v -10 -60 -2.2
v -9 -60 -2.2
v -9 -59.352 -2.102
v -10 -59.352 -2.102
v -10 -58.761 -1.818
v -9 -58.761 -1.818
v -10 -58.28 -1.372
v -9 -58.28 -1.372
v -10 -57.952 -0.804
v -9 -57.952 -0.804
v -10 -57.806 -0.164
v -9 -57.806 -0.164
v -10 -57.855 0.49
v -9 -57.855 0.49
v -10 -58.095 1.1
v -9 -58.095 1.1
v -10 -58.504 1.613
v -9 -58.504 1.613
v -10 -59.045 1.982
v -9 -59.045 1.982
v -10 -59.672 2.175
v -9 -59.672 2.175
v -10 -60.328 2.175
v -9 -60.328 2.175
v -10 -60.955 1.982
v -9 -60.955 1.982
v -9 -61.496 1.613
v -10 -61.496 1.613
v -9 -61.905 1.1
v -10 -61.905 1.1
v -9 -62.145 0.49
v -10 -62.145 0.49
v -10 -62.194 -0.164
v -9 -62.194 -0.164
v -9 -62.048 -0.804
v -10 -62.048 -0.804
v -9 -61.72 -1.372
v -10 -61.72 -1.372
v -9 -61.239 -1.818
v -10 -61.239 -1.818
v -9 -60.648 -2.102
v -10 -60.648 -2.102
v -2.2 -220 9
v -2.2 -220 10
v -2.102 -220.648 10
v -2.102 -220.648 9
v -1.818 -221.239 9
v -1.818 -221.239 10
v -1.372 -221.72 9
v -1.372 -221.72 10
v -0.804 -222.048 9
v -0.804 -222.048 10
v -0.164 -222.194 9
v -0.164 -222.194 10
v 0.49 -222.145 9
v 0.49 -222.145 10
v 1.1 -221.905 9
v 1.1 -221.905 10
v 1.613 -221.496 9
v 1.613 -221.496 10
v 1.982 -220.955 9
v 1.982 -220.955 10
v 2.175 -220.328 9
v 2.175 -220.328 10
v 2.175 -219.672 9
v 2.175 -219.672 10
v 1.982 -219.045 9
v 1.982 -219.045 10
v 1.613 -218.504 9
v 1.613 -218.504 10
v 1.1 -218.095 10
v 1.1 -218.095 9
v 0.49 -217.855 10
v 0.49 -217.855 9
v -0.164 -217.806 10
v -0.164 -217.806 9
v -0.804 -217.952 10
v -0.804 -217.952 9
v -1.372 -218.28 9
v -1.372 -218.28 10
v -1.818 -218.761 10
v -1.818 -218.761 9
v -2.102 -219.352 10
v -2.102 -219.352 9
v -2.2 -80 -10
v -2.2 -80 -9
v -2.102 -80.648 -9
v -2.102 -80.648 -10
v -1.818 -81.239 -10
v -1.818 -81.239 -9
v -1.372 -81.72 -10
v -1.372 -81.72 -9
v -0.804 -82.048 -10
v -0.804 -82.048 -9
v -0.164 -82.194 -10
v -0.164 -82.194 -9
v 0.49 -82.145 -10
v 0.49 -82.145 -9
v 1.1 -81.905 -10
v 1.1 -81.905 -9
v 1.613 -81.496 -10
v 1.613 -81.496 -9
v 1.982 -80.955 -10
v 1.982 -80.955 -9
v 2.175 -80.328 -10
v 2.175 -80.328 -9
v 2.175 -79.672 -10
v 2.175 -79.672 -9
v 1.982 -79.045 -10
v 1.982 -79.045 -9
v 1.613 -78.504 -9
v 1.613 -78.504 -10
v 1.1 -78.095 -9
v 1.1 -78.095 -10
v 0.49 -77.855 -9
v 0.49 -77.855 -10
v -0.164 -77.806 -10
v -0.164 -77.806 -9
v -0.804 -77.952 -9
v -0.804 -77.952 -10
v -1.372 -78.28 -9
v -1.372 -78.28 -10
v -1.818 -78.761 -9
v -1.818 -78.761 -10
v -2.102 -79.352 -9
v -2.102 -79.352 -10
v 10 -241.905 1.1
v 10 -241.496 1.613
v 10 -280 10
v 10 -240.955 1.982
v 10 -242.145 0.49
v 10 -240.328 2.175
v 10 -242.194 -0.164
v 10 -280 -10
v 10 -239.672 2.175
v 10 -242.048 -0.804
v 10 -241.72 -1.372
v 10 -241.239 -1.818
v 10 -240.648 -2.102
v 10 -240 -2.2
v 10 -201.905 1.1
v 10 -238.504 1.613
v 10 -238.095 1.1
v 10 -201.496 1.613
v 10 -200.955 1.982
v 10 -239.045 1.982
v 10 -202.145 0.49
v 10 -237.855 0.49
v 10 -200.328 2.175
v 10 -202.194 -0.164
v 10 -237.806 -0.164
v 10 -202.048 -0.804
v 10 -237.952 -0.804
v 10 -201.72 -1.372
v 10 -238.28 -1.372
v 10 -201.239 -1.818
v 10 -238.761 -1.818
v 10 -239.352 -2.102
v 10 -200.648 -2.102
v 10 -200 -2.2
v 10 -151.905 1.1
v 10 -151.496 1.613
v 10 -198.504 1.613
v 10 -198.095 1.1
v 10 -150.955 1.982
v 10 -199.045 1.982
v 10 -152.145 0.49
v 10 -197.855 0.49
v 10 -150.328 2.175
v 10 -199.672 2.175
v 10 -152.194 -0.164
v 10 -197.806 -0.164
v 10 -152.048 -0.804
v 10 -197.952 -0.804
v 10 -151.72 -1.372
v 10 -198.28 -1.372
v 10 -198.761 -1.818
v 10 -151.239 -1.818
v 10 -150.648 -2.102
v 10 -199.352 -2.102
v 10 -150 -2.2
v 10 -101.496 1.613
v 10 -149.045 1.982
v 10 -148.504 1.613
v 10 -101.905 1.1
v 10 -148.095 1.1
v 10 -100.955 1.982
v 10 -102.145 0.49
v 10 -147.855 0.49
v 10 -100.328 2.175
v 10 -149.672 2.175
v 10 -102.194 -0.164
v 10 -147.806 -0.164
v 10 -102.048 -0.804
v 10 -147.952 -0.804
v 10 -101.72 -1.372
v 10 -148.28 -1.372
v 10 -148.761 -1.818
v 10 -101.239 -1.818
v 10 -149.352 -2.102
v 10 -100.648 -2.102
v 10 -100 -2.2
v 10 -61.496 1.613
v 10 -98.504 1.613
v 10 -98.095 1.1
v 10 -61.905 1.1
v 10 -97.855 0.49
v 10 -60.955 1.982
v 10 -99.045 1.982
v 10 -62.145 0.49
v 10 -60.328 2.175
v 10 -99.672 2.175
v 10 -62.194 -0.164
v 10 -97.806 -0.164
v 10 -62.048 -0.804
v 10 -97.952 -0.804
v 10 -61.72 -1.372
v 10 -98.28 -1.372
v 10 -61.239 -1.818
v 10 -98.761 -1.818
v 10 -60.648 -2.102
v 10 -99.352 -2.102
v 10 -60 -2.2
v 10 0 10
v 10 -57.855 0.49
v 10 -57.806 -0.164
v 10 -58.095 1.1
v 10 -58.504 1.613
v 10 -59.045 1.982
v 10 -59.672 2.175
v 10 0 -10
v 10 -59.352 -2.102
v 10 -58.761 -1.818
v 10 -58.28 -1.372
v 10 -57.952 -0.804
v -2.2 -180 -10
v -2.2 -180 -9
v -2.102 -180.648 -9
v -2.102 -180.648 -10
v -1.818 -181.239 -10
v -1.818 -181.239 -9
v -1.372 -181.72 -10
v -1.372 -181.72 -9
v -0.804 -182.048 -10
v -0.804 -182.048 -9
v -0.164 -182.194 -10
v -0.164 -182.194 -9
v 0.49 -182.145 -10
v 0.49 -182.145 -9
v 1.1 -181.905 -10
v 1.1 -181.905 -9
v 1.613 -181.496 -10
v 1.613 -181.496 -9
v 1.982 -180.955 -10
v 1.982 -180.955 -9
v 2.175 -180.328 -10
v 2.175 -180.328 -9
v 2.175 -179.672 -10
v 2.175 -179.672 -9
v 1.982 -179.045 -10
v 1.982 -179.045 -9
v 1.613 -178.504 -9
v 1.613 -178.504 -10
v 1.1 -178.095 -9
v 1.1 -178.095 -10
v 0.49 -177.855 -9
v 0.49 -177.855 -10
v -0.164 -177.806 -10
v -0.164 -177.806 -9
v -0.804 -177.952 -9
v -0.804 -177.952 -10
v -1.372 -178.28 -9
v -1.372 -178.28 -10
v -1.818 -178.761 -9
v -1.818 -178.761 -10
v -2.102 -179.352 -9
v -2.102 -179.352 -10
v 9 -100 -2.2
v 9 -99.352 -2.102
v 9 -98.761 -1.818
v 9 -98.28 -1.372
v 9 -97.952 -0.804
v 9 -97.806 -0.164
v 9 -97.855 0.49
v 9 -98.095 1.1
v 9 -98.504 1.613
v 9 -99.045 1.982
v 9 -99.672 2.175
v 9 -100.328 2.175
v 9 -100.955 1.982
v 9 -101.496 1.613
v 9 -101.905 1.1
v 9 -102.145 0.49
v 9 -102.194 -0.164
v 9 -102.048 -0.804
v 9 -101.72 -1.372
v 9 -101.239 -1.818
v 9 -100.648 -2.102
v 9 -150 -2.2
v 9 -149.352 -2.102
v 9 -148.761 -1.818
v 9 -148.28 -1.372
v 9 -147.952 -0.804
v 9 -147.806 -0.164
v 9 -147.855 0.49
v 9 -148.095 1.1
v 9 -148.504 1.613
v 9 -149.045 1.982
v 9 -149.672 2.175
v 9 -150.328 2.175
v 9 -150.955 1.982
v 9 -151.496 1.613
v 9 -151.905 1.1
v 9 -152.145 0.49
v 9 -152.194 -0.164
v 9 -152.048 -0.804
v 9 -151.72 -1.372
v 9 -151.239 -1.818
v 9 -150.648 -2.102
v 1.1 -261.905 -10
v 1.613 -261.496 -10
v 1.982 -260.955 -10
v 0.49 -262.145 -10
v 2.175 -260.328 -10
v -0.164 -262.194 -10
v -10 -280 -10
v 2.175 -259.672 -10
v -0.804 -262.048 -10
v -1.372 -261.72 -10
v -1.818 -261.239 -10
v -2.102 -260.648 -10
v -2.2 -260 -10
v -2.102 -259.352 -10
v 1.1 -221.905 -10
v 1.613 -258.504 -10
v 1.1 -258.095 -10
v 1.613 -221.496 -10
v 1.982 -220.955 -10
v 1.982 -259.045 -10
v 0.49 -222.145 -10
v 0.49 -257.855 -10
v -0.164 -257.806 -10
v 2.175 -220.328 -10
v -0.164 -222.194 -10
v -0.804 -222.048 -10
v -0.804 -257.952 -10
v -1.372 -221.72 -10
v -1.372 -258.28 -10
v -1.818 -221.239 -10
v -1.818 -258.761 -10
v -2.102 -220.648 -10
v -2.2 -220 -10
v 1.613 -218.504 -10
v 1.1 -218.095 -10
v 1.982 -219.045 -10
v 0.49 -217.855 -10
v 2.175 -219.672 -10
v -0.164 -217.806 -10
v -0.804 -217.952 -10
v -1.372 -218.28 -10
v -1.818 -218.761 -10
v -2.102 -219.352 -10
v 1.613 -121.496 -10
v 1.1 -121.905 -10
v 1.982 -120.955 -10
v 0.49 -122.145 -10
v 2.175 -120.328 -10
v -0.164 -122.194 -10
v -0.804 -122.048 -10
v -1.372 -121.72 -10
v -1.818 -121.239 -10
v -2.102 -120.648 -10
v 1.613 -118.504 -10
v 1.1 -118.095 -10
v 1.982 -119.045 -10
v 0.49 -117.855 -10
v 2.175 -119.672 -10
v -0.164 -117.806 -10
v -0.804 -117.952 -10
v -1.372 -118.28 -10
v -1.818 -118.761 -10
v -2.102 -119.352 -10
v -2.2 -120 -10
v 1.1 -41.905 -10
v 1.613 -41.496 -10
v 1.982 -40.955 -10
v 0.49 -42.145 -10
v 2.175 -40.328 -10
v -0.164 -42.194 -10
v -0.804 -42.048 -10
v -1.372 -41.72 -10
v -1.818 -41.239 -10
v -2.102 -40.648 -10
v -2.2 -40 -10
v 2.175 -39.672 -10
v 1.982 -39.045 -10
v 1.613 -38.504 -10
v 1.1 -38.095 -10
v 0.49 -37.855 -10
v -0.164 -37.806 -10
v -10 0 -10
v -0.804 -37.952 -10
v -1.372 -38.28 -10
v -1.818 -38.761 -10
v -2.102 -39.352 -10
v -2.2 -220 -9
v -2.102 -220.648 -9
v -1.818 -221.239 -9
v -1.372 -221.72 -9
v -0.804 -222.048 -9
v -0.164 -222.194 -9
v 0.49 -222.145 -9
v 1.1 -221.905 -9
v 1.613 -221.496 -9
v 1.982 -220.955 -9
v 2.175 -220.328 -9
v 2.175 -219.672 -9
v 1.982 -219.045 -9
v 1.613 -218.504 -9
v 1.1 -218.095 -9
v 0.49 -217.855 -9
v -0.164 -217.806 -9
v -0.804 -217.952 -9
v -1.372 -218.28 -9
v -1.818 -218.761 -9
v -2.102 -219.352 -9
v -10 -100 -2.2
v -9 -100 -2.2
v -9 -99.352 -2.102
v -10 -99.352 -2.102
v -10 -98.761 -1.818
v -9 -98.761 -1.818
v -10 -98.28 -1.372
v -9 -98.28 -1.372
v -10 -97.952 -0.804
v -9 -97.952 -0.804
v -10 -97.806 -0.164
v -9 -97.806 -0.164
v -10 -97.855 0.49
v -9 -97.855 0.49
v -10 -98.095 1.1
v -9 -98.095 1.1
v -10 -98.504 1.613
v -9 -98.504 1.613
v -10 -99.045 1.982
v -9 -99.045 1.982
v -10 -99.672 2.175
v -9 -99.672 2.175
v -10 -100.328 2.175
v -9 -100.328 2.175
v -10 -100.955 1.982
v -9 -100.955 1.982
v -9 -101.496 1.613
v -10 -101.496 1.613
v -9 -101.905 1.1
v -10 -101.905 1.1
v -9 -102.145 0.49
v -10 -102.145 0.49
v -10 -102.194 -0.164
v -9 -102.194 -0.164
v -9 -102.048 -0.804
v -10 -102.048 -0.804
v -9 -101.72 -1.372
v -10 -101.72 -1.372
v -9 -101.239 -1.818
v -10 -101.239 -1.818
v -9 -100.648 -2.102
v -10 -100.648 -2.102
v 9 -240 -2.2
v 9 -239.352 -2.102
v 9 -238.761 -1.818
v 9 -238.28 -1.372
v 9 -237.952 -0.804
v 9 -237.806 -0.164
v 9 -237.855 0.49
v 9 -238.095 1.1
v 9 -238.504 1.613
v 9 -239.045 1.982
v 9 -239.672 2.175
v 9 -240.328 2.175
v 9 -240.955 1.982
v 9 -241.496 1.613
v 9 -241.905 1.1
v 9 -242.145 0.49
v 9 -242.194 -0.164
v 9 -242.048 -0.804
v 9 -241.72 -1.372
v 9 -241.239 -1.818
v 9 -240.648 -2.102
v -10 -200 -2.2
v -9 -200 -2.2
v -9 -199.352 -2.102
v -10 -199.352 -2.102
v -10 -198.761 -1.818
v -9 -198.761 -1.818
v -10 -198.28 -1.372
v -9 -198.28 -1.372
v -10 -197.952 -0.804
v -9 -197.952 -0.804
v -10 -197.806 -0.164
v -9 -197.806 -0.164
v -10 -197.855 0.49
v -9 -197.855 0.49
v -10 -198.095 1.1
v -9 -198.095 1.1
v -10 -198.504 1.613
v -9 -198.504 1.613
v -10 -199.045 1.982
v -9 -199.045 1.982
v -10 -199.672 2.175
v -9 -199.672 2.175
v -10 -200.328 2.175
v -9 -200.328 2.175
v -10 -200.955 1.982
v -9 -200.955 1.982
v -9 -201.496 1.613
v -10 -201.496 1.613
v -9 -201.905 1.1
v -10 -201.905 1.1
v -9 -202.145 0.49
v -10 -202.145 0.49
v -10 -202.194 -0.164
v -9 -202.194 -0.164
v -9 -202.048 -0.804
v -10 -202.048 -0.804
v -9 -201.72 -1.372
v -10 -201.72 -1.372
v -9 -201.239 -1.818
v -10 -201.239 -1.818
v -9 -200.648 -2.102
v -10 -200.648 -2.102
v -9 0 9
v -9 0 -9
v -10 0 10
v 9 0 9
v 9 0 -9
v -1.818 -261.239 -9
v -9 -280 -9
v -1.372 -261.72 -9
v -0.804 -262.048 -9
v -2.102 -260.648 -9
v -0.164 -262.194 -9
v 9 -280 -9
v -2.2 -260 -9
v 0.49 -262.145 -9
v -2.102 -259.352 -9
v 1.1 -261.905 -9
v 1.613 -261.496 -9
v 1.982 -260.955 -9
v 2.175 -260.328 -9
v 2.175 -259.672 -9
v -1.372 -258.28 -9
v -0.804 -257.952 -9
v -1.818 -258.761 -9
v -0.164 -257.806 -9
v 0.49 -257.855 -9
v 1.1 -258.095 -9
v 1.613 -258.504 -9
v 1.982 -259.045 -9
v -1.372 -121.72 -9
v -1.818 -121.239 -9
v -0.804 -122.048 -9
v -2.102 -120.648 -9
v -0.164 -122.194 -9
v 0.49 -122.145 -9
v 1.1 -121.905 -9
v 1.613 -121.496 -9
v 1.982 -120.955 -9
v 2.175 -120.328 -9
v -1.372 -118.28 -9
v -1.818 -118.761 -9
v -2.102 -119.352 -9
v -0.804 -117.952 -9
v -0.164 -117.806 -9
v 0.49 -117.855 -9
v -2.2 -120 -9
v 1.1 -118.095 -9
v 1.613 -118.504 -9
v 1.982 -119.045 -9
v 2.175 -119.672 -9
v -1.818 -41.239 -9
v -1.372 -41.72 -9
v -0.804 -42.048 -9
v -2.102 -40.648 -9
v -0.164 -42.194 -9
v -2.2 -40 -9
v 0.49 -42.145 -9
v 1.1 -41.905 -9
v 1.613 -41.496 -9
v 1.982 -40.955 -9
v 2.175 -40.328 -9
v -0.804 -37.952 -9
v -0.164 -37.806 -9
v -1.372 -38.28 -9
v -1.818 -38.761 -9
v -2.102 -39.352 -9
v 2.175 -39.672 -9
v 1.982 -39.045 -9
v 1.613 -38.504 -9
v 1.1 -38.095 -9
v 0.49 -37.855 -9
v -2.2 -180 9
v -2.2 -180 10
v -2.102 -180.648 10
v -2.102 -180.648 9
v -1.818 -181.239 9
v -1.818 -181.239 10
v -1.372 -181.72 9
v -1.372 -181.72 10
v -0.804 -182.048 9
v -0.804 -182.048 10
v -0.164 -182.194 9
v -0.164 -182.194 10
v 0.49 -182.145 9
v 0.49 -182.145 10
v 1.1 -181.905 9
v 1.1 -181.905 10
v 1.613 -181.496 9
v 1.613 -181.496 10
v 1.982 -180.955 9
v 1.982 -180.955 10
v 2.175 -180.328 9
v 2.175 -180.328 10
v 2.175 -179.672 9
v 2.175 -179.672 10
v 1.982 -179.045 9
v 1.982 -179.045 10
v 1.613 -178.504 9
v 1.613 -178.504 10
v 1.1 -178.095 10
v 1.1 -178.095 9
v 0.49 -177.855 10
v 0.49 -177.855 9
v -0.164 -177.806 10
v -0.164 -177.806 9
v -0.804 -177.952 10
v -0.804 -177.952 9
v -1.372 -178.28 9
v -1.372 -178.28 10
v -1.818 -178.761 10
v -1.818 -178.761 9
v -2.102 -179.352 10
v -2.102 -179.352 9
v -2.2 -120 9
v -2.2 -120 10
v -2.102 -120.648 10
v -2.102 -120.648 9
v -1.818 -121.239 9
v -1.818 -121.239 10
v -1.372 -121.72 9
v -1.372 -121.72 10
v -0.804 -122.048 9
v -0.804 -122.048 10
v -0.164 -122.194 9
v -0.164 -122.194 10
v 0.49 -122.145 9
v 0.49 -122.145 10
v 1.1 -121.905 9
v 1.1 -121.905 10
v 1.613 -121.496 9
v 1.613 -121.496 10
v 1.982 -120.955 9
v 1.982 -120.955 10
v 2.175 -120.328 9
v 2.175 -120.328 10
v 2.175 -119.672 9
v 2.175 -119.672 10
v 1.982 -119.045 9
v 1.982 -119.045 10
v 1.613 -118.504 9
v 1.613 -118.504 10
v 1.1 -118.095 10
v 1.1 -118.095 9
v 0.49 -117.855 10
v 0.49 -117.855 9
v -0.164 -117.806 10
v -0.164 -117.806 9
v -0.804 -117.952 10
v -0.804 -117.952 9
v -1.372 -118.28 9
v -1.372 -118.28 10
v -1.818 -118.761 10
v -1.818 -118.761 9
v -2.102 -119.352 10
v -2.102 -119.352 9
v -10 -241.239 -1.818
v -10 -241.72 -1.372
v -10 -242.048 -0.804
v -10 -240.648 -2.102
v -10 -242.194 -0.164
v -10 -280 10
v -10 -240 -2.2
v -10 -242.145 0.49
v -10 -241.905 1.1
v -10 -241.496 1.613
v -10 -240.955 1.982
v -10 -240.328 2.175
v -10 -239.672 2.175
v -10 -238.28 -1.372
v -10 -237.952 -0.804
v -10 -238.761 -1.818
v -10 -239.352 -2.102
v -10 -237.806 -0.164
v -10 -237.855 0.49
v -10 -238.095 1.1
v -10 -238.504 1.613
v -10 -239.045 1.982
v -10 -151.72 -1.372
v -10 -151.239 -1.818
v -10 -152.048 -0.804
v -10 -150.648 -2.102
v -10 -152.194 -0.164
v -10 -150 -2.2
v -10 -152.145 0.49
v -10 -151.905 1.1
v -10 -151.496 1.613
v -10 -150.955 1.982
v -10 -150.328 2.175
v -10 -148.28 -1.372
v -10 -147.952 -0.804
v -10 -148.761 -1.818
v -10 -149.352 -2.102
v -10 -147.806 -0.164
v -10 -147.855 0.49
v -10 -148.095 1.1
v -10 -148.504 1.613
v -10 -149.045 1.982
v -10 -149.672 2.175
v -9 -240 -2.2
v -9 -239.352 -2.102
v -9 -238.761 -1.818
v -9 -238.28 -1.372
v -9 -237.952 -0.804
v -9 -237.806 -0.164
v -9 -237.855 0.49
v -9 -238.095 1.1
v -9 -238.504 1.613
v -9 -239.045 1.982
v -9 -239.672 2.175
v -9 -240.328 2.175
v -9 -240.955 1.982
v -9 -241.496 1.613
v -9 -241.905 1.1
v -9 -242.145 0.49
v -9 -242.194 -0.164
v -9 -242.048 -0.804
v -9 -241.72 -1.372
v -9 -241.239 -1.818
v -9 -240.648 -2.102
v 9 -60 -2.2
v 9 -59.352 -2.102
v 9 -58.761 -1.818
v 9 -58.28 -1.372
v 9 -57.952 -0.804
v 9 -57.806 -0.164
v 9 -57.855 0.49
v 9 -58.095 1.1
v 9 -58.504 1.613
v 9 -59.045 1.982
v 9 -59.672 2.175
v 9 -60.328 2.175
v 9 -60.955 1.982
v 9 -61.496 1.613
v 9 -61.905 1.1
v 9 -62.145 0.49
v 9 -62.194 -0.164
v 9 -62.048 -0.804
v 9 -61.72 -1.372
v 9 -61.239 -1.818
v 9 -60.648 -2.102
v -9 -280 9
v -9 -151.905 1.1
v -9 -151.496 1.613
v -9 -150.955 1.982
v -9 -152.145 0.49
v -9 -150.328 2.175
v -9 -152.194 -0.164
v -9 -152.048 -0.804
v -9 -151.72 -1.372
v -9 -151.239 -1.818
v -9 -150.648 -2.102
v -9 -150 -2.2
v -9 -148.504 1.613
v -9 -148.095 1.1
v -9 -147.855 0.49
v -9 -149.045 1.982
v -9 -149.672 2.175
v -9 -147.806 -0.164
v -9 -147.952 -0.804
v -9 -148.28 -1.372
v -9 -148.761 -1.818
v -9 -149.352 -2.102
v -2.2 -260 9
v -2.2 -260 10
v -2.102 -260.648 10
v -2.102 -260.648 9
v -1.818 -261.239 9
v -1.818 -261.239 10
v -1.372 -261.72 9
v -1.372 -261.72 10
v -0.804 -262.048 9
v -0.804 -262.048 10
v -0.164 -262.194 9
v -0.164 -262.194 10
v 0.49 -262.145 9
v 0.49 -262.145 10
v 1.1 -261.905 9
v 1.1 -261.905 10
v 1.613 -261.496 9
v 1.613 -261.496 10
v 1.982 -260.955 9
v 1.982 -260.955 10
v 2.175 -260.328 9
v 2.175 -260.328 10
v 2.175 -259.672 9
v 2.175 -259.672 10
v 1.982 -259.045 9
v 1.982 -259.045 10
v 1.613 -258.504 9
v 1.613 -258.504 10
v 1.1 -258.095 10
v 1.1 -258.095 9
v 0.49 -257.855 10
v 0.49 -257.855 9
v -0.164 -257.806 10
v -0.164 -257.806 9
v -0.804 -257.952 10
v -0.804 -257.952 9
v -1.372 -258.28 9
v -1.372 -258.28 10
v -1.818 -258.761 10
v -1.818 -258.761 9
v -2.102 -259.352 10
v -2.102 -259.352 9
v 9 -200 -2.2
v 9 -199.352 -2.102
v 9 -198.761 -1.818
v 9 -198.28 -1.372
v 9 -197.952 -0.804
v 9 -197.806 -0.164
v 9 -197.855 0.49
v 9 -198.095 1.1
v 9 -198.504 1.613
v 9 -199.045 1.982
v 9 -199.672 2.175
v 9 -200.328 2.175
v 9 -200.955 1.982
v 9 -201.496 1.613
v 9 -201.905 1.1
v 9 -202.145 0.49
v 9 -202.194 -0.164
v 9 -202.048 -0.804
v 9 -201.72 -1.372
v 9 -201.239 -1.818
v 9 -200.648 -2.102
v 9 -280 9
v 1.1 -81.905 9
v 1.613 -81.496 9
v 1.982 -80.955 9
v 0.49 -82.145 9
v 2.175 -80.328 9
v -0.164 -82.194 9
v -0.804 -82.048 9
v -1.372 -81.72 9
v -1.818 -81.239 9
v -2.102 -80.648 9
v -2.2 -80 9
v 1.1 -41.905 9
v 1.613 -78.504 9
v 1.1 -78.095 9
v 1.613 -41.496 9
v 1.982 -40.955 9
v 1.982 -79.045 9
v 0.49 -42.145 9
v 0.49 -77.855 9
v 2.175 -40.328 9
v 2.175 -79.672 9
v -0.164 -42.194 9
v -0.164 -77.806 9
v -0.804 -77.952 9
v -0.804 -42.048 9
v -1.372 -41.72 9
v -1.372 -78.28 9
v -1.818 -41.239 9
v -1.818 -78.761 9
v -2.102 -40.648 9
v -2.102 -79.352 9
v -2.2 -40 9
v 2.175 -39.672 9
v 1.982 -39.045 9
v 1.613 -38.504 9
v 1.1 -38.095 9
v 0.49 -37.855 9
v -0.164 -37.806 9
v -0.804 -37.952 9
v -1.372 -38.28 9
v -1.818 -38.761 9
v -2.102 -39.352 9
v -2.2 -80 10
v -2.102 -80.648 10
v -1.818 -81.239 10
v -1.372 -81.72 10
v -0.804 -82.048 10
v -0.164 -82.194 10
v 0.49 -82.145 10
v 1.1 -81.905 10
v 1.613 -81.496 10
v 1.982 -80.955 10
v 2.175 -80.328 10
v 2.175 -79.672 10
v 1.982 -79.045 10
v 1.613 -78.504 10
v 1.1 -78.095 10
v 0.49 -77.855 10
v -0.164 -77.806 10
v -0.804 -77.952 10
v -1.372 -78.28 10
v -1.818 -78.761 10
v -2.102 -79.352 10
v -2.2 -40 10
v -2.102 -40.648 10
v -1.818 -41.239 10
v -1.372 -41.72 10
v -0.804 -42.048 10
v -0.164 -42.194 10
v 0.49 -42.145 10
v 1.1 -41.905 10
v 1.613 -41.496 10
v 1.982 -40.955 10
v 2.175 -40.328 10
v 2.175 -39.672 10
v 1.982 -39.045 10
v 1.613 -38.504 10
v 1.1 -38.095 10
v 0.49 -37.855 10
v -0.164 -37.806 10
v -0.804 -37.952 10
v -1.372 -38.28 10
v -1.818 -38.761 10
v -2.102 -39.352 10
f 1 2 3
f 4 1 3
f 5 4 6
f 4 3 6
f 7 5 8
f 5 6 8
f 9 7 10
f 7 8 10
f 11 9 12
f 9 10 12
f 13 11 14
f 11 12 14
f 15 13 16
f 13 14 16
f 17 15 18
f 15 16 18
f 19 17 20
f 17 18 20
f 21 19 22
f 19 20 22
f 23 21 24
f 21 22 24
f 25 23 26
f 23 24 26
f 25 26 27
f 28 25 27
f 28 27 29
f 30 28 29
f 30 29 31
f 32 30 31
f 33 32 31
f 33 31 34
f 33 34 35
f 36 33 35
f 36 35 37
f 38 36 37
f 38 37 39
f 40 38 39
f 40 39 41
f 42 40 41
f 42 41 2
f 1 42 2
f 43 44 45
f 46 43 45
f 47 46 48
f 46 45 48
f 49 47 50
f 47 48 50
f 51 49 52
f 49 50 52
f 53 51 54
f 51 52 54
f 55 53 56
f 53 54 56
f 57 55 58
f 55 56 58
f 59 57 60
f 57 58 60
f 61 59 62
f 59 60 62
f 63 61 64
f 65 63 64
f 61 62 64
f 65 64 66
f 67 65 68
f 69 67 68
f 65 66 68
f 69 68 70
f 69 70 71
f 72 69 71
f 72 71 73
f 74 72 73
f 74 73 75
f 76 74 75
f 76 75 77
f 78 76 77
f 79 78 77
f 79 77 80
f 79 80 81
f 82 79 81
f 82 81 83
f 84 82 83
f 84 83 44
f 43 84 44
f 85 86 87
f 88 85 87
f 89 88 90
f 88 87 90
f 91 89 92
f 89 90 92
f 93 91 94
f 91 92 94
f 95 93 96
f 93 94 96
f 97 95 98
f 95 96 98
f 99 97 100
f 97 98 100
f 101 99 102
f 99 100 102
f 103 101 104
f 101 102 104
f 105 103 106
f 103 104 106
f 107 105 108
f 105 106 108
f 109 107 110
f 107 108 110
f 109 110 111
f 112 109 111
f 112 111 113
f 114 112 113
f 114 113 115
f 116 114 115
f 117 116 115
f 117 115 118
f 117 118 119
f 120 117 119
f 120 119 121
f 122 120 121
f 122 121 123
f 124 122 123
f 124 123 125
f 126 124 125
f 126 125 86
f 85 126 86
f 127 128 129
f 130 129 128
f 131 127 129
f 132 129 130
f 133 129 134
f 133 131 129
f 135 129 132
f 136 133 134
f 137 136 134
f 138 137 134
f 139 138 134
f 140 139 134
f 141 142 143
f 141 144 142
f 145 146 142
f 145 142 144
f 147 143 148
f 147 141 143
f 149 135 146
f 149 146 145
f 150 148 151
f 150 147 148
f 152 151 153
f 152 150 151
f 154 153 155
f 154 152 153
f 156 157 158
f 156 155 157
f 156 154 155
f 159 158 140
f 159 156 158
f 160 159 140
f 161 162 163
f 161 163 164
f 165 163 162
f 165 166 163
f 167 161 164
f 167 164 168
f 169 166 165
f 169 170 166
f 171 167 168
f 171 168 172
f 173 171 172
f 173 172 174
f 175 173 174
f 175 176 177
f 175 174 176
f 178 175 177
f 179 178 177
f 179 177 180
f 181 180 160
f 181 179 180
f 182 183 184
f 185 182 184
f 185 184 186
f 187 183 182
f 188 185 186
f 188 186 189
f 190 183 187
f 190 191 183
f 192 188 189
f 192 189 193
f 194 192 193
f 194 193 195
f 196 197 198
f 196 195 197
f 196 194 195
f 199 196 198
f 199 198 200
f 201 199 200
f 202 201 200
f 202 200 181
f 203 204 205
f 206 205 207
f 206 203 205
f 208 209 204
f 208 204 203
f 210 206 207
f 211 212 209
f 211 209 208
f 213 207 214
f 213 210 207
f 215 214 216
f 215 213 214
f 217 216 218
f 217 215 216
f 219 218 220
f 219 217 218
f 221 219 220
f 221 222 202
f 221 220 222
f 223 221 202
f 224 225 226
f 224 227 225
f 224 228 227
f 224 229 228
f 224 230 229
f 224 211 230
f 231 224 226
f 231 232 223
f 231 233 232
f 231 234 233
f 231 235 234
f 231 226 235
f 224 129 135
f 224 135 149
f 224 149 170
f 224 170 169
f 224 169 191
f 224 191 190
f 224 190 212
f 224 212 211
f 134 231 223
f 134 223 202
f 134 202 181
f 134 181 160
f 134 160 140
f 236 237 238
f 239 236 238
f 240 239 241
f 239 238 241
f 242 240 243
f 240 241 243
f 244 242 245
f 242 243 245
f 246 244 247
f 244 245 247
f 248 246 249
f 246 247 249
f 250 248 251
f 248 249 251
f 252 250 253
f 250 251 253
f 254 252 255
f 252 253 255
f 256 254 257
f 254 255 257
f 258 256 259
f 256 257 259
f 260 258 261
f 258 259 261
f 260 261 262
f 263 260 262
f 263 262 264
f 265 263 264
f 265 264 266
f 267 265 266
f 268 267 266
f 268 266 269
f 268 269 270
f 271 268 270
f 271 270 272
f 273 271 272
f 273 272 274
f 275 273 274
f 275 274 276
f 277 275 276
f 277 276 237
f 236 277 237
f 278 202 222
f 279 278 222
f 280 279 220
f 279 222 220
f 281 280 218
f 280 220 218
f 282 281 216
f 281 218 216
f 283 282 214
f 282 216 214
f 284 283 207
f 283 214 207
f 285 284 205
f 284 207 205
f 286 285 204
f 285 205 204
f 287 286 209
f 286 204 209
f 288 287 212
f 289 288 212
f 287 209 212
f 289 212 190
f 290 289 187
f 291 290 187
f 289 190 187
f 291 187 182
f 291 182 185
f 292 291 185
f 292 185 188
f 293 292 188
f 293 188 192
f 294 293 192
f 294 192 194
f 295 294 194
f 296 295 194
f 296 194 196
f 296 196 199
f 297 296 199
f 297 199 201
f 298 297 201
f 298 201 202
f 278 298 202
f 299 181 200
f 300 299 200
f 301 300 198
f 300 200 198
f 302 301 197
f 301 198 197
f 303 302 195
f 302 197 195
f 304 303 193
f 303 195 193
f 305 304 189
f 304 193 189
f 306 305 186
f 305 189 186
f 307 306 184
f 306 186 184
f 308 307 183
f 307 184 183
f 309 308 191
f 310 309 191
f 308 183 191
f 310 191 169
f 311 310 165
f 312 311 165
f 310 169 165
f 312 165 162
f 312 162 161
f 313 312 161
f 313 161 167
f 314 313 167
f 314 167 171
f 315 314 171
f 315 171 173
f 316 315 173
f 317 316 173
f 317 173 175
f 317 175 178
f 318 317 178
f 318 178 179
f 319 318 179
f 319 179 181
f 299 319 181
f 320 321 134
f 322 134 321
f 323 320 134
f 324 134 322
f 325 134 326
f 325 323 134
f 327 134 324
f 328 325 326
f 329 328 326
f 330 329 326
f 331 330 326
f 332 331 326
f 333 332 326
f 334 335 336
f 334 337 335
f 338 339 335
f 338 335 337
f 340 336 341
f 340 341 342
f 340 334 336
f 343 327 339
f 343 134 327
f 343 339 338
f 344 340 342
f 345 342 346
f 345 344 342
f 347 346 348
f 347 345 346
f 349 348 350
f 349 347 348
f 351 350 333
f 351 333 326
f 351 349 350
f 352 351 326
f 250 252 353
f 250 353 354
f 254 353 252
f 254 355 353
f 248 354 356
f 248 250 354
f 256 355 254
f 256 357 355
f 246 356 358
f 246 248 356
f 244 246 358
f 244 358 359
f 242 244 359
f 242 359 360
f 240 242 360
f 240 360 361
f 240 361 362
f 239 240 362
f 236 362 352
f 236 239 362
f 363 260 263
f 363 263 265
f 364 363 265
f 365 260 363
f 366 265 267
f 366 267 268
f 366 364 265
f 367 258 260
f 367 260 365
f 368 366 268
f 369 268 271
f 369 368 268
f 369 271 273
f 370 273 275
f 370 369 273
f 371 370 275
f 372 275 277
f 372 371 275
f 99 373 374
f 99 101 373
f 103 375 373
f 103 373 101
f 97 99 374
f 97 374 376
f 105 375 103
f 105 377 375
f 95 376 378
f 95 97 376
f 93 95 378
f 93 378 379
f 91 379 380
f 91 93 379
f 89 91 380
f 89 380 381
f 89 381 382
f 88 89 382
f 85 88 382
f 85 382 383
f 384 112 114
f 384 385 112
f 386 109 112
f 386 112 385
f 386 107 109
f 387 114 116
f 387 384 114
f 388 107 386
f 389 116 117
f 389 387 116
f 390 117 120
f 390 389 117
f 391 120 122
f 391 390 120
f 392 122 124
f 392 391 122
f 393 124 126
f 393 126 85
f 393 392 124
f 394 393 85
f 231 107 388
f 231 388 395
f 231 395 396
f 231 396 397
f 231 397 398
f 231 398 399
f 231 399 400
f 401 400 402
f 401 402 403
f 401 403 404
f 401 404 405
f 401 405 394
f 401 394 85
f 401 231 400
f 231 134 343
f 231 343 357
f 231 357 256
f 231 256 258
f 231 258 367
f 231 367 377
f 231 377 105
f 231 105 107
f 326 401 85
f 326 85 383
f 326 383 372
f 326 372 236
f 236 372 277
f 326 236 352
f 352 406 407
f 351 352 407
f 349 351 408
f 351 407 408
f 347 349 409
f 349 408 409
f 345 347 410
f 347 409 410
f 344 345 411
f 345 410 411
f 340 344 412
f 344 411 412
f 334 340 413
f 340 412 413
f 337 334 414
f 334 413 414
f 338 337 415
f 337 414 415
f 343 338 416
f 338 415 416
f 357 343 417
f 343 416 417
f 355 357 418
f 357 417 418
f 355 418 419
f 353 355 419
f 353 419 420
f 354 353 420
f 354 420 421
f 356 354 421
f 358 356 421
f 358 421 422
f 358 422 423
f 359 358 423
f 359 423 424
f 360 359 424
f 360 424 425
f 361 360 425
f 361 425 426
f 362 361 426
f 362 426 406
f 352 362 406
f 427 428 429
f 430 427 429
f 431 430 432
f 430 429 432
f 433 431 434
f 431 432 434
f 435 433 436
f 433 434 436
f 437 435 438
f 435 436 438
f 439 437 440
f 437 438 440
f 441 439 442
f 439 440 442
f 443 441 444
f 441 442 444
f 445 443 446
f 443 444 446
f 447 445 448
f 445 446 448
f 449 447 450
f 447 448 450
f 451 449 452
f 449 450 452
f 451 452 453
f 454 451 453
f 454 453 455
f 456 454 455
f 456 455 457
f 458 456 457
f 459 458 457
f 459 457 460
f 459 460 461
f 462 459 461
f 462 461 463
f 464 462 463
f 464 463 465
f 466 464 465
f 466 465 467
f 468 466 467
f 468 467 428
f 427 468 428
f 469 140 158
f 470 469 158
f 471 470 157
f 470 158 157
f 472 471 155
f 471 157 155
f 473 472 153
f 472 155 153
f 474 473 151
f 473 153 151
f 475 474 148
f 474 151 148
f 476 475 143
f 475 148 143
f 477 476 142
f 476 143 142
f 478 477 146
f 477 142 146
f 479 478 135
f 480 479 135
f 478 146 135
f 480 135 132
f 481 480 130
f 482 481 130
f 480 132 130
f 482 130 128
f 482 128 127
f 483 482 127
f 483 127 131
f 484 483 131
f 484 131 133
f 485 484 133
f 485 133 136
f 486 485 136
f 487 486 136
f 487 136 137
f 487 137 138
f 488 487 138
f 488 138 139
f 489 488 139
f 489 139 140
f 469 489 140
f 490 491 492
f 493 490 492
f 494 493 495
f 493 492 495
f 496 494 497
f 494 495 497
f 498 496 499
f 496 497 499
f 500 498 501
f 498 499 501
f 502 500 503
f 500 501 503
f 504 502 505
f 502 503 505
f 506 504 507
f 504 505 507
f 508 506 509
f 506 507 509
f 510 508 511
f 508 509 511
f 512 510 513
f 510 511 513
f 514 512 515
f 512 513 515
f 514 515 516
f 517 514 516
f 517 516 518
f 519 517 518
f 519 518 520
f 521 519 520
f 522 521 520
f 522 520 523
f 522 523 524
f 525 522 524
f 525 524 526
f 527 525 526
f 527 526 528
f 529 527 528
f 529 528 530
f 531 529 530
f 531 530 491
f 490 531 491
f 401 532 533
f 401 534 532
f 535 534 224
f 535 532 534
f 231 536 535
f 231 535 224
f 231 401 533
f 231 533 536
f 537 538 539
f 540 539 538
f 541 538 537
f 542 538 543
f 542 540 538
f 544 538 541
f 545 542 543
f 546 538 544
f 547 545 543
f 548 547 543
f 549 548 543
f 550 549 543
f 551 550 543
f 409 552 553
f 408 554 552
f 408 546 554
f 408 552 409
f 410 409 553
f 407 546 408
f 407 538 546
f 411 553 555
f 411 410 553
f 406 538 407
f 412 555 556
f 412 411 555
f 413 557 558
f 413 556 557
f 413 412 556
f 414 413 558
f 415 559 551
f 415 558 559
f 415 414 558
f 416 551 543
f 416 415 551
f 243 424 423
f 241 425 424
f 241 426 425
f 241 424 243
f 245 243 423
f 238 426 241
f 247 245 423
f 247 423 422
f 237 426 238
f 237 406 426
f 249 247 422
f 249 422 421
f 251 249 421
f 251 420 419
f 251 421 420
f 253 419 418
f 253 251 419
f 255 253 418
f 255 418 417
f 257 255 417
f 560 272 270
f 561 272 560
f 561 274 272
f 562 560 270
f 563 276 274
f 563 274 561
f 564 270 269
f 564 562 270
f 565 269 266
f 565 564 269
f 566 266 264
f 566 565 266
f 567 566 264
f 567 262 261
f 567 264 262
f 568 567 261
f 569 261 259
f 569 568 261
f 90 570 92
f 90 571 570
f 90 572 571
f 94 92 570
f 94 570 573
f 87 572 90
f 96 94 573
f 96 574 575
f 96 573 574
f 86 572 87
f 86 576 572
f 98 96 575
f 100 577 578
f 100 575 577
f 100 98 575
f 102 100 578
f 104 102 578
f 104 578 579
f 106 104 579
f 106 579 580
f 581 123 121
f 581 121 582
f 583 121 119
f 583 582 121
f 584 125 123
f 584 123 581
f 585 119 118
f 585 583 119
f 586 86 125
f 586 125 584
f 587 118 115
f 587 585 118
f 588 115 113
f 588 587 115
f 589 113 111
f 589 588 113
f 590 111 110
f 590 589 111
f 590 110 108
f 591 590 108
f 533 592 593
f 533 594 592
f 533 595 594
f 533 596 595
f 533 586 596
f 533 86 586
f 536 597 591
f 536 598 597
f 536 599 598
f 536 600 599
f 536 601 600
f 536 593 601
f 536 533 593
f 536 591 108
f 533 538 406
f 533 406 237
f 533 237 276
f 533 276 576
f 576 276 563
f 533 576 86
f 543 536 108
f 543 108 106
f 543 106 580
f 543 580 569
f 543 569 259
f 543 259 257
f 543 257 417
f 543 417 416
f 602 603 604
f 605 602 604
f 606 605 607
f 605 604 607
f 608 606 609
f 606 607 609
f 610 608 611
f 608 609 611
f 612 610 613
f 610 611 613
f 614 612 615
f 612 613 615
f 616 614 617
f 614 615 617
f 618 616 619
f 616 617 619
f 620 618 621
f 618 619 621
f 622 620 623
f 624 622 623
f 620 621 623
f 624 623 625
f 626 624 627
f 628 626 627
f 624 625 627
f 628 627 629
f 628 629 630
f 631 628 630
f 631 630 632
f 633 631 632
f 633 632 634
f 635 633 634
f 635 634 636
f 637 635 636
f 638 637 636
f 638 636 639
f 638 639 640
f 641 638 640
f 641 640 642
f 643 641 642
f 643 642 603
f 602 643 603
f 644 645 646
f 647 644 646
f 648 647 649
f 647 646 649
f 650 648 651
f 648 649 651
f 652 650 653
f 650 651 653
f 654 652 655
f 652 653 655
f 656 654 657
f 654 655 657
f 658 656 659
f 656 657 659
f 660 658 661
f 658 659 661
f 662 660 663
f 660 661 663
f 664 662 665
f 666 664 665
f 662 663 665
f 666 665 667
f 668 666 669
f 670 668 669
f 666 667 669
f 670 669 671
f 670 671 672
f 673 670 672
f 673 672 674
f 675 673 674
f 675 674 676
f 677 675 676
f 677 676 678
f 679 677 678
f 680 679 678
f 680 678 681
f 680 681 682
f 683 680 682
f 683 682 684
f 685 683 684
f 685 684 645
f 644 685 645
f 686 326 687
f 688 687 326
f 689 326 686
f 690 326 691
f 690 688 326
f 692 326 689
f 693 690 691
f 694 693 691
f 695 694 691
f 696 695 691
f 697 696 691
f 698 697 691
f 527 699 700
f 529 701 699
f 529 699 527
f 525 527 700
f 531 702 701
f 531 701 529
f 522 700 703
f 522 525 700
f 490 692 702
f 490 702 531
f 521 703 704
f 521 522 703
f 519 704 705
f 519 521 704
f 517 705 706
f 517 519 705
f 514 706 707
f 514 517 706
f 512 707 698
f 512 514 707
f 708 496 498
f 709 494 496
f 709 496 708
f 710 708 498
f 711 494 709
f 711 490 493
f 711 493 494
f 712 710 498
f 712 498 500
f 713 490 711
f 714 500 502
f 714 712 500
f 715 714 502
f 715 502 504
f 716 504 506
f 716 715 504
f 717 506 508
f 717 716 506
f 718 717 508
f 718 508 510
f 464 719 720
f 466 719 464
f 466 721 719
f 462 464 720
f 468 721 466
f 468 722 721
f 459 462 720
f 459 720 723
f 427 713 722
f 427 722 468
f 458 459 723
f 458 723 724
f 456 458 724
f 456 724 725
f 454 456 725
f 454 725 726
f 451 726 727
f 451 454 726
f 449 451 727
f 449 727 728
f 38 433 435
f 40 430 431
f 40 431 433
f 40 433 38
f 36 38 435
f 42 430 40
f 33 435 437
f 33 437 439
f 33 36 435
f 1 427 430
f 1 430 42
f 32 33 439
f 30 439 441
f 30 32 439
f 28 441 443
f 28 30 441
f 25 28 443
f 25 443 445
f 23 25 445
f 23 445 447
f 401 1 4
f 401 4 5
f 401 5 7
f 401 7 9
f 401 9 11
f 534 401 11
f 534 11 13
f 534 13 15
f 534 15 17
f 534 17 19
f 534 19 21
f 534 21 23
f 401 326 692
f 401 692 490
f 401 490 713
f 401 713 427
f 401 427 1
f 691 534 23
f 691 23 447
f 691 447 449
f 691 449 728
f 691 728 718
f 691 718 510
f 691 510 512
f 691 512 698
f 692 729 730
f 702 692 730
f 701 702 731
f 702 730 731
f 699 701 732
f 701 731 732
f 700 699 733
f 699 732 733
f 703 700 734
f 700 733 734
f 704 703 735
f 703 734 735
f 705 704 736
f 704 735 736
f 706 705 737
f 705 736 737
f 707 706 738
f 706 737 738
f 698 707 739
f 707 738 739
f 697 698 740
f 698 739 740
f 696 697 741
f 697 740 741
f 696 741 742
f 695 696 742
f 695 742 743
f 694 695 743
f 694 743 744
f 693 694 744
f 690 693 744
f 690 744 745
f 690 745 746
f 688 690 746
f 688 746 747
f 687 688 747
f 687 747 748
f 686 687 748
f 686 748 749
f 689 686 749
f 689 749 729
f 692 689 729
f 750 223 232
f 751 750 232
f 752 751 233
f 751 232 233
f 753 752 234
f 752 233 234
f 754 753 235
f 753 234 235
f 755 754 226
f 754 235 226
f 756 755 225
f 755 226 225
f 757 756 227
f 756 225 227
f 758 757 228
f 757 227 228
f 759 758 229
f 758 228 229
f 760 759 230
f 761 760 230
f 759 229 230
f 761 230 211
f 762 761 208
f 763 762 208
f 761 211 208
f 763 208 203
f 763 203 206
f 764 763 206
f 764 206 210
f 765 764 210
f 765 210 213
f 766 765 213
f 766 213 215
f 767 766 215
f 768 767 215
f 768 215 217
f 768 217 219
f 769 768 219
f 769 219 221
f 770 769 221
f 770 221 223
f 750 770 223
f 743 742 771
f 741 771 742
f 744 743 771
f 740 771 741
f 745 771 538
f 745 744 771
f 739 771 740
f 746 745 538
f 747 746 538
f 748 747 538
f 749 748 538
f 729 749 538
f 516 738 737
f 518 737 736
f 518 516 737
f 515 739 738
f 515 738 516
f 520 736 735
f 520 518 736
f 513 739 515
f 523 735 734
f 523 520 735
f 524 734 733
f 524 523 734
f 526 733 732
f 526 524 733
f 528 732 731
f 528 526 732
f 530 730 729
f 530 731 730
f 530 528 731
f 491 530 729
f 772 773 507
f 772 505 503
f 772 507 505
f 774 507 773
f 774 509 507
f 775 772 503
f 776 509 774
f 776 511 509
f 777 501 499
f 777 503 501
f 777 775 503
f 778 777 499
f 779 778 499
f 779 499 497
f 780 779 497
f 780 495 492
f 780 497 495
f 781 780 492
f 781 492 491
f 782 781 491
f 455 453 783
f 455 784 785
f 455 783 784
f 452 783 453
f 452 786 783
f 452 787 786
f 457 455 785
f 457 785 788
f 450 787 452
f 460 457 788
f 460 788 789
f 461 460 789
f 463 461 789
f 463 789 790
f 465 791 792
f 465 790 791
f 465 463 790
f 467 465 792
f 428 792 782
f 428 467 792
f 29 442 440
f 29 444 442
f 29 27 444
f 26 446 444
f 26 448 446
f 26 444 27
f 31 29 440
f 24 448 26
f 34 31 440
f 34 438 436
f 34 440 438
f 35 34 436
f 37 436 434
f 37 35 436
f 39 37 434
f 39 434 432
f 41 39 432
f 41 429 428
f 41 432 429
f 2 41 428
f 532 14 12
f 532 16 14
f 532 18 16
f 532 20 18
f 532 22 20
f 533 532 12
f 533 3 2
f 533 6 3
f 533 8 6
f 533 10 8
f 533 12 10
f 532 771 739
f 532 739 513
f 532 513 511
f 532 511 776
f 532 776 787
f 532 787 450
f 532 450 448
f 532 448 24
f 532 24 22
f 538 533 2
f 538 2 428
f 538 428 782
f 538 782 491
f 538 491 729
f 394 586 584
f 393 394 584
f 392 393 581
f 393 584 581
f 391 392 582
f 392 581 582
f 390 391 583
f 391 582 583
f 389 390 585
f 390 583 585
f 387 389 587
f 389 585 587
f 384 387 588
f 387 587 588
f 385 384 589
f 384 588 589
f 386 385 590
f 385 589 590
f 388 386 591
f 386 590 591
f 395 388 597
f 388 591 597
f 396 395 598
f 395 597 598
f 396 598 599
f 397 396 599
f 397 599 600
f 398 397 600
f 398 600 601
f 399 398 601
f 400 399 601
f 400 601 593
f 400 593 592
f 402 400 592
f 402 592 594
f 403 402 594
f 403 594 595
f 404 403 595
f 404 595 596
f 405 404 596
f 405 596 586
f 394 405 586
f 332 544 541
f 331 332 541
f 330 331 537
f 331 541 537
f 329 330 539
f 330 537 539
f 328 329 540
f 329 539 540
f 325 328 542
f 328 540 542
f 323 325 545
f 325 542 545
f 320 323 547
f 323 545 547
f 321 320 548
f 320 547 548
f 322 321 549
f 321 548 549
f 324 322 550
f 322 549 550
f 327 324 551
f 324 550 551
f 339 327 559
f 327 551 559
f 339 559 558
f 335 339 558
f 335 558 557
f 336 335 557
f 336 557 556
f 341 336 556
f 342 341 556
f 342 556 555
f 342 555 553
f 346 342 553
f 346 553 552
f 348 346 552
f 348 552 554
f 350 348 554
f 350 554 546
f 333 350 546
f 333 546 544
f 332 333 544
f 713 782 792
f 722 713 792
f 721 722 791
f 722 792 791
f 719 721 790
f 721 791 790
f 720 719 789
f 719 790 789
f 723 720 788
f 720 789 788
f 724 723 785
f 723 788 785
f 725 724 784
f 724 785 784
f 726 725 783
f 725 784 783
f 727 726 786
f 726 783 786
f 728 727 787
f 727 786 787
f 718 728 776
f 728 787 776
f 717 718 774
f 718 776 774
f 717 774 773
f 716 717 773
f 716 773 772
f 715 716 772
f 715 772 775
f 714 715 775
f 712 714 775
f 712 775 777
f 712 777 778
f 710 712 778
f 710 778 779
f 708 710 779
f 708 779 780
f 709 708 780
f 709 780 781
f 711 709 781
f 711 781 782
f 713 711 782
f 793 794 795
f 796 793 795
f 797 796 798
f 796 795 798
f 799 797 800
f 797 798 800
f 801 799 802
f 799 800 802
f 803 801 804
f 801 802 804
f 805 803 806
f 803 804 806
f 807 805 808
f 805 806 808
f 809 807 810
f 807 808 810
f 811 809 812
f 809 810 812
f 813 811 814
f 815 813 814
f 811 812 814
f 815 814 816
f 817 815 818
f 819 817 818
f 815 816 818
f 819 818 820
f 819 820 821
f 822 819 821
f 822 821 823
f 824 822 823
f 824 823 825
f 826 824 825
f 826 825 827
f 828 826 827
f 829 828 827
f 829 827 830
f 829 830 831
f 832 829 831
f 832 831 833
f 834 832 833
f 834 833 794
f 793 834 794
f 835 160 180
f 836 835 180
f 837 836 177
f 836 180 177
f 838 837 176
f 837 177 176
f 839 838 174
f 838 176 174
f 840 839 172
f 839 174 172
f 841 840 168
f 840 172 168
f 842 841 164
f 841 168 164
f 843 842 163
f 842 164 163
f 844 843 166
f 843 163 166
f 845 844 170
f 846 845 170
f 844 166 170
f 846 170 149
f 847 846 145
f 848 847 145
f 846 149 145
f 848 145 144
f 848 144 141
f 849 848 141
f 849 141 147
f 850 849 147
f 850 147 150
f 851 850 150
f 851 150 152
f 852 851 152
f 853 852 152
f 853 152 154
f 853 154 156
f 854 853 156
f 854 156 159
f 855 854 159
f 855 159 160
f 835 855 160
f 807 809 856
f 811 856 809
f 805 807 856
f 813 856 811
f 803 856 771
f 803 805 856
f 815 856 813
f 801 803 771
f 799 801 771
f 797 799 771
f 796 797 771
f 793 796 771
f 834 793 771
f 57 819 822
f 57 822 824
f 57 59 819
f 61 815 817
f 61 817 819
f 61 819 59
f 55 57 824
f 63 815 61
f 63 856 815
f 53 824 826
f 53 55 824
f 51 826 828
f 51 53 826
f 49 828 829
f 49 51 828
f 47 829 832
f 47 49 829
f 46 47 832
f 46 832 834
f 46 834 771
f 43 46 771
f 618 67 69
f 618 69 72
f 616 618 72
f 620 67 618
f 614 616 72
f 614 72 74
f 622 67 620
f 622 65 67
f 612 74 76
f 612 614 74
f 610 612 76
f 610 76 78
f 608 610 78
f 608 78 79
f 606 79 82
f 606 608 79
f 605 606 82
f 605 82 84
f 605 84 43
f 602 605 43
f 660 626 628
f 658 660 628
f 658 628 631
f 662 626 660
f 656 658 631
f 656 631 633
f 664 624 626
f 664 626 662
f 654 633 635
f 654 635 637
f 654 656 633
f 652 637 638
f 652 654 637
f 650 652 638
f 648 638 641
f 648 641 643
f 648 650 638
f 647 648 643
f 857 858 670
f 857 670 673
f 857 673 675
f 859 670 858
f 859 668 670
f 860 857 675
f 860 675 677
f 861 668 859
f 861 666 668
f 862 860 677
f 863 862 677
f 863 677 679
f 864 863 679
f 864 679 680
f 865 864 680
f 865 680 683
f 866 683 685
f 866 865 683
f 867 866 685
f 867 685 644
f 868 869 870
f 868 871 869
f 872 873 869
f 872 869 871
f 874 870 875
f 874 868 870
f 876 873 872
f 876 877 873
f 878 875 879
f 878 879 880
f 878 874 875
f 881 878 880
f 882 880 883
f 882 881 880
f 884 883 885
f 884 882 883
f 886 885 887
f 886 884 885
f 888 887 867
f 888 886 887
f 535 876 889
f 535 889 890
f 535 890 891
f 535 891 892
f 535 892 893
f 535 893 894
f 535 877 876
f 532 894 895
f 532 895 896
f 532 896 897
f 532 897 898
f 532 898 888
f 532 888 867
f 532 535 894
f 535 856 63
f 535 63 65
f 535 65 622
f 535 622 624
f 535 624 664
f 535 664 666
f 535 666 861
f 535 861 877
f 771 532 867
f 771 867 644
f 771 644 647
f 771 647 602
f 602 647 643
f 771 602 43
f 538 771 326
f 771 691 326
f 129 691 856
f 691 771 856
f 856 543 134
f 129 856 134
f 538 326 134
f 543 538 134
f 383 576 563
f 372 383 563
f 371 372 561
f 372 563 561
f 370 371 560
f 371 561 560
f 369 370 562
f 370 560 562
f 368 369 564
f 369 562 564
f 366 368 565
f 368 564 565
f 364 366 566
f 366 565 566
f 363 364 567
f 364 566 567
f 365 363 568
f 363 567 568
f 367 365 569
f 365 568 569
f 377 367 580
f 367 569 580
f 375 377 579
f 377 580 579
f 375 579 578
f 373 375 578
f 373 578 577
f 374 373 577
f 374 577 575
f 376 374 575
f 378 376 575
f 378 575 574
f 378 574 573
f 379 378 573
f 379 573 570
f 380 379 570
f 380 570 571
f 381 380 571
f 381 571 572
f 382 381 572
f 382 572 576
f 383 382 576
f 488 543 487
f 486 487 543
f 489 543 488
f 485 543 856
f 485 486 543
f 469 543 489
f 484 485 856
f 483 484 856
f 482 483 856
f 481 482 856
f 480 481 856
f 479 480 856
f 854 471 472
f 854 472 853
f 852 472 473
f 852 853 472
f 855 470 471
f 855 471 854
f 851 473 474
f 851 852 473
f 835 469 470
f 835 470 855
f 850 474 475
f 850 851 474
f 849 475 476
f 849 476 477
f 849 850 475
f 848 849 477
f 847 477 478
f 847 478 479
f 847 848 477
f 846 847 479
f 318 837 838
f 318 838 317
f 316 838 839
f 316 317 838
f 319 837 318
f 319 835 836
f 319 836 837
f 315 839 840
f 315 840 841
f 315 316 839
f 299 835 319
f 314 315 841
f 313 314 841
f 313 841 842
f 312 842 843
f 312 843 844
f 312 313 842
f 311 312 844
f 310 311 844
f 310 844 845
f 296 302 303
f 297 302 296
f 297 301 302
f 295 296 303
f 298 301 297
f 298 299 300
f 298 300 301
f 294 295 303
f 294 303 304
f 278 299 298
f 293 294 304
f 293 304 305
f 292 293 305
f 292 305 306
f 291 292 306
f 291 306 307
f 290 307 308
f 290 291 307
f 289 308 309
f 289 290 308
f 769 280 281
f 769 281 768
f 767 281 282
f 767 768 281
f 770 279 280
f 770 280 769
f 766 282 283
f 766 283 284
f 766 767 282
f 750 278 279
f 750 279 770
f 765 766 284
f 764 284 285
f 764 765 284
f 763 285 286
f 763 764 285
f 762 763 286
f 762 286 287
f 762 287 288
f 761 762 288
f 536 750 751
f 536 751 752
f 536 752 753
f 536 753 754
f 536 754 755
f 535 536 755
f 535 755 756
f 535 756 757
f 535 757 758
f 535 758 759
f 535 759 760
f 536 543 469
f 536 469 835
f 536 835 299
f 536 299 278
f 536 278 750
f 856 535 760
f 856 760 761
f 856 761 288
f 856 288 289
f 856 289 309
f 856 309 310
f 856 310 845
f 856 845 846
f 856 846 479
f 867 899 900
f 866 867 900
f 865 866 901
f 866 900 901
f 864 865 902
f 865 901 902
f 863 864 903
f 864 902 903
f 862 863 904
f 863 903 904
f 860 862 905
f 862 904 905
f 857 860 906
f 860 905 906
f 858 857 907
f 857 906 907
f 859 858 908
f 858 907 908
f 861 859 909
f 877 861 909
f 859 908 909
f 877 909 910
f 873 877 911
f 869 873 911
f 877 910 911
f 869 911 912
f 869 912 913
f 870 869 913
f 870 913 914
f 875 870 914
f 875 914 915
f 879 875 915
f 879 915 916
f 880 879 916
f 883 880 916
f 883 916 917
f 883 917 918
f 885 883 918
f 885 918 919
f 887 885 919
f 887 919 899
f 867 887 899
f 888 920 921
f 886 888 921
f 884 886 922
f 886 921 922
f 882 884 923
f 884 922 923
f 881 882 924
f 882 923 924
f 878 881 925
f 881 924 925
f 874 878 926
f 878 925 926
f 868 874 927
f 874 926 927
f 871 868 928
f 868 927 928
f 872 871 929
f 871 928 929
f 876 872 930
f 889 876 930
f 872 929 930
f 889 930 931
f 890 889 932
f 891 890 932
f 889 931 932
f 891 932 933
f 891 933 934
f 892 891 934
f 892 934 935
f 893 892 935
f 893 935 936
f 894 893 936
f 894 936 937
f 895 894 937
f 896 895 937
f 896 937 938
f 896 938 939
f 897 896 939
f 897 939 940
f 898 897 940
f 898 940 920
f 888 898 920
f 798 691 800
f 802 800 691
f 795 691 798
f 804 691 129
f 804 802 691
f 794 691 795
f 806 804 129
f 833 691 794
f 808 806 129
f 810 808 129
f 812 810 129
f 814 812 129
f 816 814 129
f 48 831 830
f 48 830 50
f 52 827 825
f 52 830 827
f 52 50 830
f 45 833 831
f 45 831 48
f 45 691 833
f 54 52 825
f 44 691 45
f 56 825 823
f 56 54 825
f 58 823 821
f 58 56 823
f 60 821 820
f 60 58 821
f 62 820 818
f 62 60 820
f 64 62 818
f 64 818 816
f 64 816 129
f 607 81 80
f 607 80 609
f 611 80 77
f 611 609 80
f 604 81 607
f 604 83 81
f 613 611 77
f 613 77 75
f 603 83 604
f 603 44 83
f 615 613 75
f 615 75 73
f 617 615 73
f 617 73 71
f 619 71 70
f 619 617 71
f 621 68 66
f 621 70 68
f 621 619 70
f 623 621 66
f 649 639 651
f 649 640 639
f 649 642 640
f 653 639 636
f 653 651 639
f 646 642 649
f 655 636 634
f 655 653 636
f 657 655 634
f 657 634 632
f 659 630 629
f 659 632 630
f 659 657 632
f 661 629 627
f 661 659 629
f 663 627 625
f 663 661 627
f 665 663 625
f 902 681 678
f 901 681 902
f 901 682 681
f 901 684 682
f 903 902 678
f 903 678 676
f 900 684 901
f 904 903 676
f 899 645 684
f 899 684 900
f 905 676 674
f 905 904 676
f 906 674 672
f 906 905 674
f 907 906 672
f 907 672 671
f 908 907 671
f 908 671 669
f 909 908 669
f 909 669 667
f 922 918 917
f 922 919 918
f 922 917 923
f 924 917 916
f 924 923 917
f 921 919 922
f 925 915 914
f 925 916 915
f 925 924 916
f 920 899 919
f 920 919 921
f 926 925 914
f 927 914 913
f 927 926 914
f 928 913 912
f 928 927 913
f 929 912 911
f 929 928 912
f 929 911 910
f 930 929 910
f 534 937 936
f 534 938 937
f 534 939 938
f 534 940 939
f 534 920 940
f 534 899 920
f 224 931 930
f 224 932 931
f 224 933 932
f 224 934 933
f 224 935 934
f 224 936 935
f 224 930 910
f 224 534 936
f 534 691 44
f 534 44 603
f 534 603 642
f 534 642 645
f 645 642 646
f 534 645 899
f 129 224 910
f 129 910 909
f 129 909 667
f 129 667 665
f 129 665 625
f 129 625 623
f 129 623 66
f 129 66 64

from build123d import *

# Parameters (mm, degrees)
EXTRUDE_1_DEPTH     = 280
SKETCH_2_R          = 2.2
CUT_EXTRUDE_1_DEPTH = 280
SKETCH_3_R          = 2.2
CUT_EXTRUDE_2_DEPTH = 20


with BuildPart() as part:
    # 草图1 → 凸台-拉伸1 (new body)
    with BuildSketch(Plane(origin=(0, 0, 0), x_dir=(1, 0, 0), z_dir=(0, 1, 0))):
        Polygon((10, 0), (10, 10), (0, 10), (-10, 10), (-10, 0), (-10, -10), (0, -10), (10, -10), align=None)
        Polygon((9, 0), (9, 9), (0, 9), (-9, 9), (-9, 0), (-9, -9), (0, -9), (9, -9), align=None, mode=Mode.SUBTRACT)
    extrude(amount=-EXTRUDE_1_DEPTH)

    # 草图2 → 切除-拉伸1 (cut)
    with BuildSketch(Plane.XY.offset(10)):
        with Locations(Location((0, -40, 0), (0, 0, 180))):
            Circle(SKETCH_2_R)
        with Locations(Location((0, -80, 0), (0, 0, 180))):
            Circle(SKETCH_2_R)
        with Locations(Location((0, -120, 0), (0, 0, 180))):
            Circle(SKETCH_2_R)
        with Locations(Location((0, -180, 0), (0, 0, 180))):
            Circle(SKETCH_2_R)
        with Locations(Location((0, -220, 0), (0, 0, 180))):
            Circle(SKETCH_2_R)
        with Locations(Location((0, -260, 0), (0, 0, 180))):
            Circle(SKETCH_2_R)
    extrude(amount=-CUT_EXTRUDE_1_DEPTH, mode=Mode.SUBTRACT)

    # 草图3 → 切除-拉伸2 (cut)
    with BuildSketch(Plane(origin=(10, 0, 0), x_dir=(0, 0, -1), z_dir=(1, 0, 0))):
        with Locations((0, -60)):
            Circle(SKETCH_3_R)
        with Locations((0, -100)):
            Circle(SKETCH_3_R)
        with Locations((0, -150)):
            Circle(SKETCH_3_R)
        with Locations((0, -200)):
            Circle(SKETCH_3_R)
        with Locations((0, -240)):
            Circle(SKETCH_3_R)
    extrude(amount=-CUT_EXTRUDE_2_DEPTH, mode=Mode.SUBTRACT)


solid = part.part
